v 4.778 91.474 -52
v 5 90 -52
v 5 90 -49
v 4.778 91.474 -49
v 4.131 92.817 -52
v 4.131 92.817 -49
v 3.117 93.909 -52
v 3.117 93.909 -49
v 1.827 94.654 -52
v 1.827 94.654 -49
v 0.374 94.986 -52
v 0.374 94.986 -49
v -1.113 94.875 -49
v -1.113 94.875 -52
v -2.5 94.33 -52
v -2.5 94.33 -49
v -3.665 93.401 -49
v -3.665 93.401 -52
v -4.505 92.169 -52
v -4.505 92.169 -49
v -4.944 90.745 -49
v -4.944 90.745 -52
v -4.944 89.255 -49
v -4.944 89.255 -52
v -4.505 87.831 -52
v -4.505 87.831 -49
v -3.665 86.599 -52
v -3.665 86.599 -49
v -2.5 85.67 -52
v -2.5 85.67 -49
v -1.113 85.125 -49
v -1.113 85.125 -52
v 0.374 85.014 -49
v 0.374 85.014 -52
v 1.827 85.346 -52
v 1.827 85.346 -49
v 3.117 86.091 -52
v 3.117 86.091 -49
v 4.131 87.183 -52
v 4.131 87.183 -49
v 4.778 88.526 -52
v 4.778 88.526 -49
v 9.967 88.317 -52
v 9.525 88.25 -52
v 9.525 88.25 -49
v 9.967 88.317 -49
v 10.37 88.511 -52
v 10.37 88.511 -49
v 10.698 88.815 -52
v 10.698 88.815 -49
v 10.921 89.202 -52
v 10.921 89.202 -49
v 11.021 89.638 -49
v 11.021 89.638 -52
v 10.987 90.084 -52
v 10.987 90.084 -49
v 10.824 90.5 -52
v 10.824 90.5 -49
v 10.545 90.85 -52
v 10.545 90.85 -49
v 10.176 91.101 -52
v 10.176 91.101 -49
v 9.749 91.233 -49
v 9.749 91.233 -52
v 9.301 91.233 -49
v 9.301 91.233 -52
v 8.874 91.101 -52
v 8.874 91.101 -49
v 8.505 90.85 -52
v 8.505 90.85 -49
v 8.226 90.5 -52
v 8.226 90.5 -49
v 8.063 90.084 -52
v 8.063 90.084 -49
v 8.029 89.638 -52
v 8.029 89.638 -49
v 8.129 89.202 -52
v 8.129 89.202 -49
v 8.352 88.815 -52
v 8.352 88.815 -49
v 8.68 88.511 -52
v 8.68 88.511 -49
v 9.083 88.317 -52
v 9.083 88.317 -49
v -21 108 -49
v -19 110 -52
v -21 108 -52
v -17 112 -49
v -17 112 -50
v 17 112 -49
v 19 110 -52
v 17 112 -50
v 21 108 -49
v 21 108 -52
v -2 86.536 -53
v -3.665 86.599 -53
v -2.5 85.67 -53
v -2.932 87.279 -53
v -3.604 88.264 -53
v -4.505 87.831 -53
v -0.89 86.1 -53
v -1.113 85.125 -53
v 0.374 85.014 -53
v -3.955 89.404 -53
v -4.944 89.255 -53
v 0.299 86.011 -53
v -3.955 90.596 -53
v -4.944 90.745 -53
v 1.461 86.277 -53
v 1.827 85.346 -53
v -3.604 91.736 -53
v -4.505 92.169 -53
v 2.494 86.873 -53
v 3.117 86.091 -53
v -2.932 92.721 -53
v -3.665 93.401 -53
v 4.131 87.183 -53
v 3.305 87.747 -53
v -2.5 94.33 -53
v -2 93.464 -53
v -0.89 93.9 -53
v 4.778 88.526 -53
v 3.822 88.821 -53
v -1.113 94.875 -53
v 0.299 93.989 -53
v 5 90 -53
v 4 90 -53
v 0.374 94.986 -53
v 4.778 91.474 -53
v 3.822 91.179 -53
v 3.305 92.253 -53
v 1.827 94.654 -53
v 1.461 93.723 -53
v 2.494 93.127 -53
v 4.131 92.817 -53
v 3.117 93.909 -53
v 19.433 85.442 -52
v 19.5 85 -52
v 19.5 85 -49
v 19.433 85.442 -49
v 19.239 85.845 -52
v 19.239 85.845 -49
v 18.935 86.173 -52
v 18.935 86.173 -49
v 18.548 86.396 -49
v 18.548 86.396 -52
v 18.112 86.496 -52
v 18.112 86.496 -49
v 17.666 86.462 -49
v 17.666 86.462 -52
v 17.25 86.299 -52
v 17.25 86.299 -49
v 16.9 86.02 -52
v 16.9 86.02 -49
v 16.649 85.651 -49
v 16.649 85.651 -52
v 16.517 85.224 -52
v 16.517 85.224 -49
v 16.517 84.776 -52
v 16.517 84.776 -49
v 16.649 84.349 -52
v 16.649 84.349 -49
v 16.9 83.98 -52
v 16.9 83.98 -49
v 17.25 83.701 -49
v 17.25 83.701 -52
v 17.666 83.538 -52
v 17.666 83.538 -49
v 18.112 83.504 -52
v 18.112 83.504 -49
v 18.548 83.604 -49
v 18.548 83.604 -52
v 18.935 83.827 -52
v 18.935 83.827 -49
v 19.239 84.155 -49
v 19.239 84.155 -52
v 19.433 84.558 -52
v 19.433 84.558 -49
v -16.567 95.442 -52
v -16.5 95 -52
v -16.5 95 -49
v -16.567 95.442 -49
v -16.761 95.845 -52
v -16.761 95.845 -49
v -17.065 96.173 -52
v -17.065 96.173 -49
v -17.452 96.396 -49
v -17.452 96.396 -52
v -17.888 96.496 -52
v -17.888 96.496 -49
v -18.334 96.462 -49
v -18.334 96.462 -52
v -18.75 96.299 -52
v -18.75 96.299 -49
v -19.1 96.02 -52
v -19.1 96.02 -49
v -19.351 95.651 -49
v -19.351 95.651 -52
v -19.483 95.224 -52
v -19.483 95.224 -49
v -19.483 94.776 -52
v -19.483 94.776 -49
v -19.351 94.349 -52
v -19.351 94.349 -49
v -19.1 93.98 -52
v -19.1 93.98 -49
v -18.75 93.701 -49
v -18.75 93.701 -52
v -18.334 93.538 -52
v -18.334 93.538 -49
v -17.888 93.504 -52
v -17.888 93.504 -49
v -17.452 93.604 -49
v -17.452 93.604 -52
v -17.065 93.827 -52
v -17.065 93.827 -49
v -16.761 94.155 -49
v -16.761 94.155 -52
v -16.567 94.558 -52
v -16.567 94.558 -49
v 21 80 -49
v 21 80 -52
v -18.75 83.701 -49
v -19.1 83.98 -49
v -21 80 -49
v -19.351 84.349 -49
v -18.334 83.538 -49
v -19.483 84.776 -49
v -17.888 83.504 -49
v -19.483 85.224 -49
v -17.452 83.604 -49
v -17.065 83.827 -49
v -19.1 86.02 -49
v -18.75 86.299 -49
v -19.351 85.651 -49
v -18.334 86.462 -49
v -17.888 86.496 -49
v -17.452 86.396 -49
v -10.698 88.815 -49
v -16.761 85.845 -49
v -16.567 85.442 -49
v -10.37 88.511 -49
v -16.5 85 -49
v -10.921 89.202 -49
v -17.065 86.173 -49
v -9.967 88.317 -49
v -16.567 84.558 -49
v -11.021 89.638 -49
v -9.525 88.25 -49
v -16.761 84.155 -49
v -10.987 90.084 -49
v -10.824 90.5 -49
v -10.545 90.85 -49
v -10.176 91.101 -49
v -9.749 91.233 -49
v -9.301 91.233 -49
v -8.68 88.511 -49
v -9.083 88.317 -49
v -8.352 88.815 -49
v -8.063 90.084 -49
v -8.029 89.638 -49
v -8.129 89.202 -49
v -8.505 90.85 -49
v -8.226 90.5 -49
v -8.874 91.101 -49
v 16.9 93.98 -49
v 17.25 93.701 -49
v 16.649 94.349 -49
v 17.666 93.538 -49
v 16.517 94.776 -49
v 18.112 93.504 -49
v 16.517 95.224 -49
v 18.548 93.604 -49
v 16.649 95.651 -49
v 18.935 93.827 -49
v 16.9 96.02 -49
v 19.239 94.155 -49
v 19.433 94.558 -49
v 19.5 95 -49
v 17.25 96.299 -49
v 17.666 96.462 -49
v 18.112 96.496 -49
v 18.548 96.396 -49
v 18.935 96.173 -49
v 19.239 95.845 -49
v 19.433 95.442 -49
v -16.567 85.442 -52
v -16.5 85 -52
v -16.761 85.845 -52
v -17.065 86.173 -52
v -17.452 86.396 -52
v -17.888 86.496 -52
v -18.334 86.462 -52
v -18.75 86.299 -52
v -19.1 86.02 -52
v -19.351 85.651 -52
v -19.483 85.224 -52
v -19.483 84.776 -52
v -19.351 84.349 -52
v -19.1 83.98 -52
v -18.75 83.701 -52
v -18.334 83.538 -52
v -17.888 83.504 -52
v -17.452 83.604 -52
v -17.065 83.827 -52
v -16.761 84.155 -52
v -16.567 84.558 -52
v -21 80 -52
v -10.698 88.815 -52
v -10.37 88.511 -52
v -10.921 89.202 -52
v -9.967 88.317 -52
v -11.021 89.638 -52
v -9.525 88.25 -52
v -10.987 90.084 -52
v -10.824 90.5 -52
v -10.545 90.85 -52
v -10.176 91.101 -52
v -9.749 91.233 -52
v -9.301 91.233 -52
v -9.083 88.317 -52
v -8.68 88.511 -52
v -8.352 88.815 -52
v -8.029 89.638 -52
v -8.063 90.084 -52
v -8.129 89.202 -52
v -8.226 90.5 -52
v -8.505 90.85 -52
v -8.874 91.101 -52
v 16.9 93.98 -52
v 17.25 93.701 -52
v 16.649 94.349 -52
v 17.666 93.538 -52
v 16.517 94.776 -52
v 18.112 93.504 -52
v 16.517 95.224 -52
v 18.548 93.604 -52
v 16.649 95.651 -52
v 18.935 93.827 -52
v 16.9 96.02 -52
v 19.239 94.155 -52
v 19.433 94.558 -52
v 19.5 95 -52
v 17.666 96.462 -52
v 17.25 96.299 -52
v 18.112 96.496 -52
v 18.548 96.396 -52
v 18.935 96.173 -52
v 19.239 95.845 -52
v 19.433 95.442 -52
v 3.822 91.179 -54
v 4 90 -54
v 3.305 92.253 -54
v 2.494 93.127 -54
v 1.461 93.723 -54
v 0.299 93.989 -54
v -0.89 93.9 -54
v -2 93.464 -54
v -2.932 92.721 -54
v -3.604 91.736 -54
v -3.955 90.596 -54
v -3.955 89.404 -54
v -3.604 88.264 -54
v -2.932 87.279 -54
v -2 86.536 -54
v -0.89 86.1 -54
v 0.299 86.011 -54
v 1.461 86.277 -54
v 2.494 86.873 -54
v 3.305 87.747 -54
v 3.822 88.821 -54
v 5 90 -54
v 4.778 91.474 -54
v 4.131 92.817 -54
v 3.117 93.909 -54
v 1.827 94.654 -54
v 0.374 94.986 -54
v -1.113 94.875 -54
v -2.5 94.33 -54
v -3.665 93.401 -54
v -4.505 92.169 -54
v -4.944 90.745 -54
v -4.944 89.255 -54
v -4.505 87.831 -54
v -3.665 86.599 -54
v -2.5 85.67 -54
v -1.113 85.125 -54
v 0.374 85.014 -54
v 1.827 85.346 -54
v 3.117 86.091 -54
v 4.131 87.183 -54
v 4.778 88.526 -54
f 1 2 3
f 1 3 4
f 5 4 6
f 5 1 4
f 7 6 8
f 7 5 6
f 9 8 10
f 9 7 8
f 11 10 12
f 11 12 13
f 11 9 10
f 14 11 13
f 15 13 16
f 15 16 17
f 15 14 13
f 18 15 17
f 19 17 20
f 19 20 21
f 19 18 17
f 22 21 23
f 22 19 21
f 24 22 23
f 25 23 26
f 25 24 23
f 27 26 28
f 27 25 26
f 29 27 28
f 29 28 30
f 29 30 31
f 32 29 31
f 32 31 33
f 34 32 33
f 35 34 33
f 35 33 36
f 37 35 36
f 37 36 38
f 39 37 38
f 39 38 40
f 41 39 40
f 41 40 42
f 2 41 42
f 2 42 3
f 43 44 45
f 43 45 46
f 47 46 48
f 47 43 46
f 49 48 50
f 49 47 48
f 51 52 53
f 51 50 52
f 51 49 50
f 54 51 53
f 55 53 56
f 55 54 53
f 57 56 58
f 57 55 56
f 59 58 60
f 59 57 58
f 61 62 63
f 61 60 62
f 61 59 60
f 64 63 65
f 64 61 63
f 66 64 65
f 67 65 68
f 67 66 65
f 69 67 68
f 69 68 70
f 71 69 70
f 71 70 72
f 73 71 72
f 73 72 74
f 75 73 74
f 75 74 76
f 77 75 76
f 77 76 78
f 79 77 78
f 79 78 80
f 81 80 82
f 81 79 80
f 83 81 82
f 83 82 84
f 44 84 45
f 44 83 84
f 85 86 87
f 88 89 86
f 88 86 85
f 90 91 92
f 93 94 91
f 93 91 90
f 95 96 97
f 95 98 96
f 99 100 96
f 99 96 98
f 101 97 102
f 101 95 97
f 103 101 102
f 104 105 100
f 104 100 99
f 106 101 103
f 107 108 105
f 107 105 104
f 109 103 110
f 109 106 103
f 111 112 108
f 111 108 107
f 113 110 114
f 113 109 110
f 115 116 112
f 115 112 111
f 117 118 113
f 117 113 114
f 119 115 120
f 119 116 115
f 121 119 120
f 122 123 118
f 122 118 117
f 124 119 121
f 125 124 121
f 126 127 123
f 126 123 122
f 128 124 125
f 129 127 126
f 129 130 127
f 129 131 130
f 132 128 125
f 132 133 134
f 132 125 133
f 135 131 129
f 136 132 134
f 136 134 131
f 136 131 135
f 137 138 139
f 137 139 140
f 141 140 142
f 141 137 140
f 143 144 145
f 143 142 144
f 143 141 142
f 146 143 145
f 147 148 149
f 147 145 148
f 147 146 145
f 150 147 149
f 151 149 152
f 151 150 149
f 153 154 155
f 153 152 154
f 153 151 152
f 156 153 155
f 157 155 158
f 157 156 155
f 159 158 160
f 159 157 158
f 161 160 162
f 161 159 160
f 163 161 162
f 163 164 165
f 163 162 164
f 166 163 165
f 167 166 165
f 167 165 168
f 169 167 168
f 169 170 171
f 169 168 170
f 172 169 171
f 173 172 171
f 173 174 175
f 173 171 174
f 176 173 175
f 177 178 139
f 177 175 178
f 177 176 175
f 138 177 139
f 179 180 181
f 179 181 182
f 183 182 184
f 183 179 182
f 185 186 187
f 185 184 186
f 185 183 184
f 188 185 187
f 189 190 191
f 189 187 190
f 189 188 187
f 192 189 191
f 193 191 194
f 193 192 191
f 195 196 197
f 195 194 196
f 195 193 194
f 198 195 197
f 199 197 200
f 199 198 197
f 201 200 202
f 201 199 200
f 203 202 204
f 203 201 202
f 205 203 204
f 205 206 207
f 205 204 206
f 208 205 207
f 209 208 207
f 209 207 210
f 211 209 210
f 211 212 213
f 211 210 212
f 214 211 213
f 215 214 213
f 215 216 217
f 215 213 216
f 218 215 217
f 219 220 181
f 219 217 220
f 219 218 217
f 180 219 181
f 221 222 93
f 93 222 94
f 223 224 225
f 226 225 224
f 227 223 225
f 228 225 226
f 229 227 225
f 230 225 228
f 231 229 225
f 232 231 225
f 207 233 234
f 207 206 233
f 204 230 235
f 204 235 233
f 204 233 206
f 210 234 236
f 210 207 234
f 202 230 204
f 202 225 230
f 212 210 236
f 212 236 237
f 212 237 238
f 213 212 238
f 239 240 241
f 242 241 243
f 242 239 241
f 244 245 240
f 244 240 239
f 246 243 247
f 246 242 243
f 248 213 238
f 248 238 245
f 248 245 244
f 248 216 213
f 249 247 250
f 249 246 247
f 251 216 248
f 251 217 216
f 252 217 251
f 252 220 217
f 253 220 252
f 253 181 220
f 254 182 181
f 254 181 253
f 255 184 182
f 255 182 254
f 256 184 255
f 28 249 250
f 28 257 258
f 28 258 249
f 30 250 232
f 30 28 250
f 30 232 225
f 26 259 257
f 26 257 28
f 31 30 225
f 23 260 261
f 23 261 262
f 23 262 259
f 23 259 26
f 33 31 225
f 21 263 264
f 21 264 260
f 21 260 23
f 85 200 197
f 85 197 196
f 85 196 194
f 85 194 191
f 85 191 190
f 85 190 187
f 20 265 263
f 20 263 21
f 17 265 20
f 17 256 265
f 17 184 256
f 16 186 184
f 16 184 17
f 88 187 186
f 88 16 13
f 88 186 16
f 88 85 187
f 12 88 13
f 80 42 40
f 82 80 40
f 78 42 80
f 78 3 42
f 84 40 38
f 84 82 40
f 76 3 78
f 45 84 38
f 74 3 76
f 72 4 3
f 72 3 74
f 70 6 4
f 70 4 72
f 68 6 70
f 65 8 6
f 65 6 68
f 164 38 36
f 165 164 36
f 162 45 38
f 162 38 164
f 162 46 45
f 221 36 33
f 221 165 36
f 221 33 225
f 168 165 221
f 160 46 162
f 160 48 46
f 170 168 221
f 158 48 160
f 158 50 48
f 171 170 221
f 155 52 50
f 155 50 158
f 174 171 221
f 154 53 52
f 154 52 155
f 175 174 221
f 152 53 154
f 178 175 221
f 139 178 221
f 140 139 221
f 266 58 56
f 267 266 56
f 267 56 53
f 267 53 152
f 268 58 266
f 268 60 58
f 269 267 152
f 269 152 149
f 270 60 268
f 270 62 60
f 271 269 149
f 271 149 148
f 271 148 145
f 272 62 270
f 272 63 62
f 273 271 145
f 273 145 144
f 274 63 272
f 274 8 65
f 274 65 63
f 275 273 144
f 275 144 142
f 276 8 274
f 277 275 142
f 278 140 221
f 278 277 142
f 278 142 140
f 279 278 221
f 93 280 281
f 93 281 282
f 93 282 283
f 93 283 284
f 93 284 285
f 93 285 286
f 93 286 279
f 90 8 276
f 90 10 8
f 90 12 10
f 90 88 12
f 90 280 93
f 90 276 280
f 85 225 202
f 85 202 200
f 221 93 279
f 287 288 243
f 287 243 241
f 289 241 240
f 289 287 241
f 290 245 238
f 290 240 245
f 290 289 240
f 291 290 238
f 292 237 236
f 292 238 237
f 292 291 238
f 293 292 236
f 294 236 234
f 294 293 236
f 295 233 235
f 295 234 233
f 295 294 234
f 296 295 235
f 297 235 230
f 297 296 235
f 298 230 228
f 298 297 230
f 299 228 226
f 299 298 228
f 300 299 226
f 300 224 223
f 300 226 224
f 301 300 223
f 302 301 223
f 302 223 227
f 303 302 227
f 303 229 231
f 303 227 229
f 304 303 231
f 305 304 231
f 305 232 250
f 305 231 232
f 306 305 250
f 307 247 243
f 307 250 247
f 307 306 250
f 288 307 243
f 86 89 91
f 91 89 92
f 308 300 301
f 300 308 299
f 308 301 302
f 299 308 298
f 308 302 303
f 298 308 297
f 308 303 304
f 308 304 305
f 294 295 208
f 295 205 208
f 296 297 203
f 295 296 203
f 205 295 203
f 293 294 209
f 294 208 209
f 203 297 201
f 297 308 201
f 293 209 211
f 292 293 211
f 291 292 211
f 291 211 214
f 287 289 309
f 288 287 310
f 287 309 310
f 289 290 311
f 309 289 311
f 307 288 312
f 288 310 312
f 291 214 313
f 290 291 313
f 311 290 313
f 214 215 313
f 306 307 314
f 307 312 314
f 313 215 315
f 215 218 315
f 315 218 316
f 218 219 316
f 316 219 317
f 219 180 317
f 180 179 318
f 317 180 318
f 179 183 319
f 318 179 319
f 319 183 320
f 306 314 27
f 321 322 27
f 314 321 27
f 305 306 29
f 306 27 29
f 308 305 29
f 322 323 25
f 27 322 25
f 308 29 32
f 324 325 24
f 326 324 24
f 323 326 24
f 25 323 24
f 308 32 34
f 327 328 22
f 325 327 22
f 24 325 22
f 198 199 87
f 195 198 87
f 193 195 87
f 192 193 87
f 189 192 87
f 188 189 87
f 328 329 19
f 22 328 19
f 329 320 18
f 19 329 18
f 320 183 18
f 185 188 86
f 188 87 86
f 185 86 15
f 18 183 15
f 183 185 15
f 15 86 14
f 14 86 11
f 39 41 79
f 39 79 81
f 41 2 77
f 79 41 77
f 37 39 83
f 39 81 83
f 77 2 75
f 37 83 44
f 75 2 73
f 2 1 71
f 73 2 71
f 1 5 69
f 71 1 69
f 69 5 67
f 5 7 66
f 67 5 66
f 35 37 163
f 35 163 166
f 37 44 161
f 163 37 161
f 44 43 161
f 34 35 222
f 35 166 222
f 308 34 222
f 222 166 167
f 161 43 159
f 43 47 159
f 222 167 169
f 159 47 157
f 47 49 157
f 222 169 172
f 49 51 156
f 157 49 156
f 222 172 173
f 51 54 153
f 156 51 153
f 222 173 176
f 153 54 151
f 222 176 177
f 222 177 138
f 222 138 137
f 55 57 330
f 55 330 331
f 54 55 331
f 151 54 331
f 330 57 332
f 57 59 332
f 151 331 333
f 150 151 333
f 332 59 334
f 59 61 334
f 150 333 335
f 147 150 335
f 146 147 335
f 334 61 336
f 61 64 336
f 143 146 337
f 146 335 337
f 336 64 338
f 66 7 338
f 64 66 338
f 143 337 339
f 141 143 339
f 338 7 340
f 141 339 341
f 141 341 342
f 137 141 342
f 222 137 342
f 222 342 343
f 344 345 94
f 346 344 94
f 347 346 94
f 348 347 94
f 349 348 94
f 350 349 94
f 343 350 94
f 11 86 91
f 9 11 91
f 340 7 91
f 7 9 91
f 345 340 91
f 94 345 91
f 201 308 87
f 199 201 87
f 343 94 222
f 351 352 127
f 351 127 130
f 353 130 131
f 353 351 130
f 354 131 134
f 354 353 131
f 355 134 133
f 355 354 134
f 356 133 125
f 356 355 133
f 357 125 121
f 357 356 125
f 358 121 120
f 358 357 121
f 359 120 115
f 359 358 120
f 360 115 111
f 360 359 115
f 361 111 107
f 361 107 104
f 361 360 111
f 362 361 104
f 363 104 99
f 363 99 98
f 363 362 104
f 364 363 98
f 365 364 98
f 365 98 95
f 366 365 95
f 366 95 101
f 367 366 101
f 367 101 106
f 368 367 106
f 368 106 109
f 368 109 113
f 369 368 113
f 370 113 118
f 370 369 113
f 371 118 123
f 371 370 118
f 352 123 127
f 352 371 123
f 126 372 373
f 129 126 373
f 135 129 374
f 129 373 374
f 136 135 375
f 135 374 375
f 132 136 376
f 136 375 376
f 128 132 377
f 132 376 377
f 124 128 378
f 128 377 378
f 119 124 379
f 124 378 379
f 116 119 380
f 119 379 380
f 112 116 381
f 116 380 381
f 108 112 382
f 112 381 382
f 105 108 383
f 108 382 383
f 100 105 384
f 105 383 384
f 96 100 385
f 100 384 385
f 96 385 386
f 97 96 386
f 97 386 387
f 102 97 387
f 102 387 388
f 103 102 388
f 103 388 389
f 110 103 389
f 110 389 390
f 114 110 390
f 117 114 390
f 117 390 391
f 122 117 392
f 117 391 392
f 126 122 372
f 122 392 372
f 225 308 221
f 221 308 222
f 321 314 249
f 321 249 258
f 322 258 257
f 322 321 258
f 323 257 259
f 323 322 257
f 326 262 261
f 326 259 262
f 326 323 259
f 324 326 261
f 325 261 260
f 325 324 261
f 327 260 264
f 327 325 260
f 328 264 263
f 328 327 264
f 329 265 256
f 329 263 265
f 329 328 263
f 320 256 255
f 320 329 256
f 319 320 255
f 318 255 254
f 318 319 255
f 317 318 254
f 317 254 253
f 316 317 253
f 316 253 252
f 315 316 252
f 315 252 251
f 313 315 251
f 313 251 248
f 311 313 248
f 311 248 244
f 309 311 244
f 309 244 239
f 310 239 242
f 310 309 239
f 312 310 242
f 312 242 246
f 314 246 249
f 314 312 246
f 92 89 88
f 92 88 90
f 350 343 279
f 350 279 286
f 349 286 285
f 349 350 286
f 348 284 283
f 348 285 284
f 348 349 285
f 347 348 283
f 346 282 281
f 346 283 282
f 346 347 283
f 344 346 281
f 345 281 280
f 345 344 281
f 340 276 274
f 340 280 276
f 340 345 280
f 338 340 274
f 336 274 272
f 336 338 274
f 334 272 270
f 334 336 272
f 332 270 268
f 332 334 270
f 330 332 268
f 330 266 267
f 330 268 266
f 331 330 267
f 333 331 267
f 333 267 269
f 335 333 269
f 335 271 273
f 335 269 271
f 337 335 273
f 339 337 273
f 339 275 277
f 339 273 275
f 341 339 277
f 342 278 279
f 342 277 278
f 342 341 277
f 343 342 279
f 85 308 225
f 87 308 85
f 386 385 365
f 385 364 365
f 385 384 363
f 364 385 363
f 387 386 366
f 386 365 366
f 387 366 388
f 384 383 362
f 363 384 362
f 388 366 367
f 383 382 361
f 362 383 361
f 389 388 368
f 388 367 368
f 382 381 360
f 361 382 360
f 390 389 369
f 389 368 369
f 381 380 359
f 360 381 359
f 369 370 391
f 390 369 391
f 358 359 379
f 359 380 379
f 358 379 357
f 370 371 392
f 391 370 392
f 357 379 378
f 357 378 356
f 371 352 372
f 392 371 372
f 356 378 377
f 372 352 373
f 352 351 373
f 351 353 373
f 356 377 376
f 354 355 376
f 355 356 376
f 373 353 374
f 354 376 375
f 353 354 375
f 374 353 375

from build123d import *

# Parameters (mm, degrees)
TUBE066_R                   = 5
TUBE066_R_2                 = 4
TUBE066_DEPTH               = 1
CYLINDER1691_R              = 1.5
CYLINDER1691_DEPTH          = 20
CYLINDER1688_R              = 1.5
CYLINDER1688_DEPTH          = 20
COMPOUND839_ROLL_ANGLE      = 90
COMPOUND839_PLACEMENT_ANGLE = 90
CYLINDER1679_R              = 1.5
CYLINDER1679_DEPTH          = 60
CYLINDER1686_R              = 1.5
CYLINDER1686_DEPTH          = 60
CYLINDER1680_R              = 1.5
CYLINDER1680_DEPTH          = 60
CYLINDER1684_R              = 1.5
CYLINDER1684_DEPTH          = 60
CYLINDER1678_R              = 5
CYLINDER1678_DEPTH          = 4
BOX658_W                    = 42
BOX658_H                    = 32
BOX658_DEPTH                = 3
CHAMFER052_SIZE             = 4
CHAMFER051_SIZE             = 2


with BuildPart() as tube066:
    # Tube066 → Tube066 (new body)
    with BuildSketch(Plane(origin=(0, 90, -54), x_dir=(1, 0, 0), z_dir=(0, 0, 1))):
        Circle(TUBE066_R)
        Circle(TUBE066_R_2, mode=Mode.SUBTRACT)
    extrude(amount=TUBE066_DEPTH)


with BuildPart() as v_lec1691:
    # Cylinder1691 → Cylinder1691 (new body)
    with BuildSketch(Plane(origin=(15.75, 114, 58.525), x_dir=(-1, 0, 0), z_dir=(0, 1, 0))):
        Circle(CYLINDER1691_R)
    extrude(amount=CYLINDER1691_DEPTH)


with BuildPart() as compound843:
    # Cylinder1688 → Cylinder1688 (new body)
    with BuildSketch(Plane(origin=(15.75, 114, 39.475), x_dir=(-1, 0, 0), z_dir=(0, 1, 0))):
        Circle(CYLINDER1688_R)
    extrude(amount=CYLINDER1688_DEPTH)

    # Compound839: union Válec1691
    add(v_lec1691.part)


with BuildPart() as compound843_1:
    # Compound839 roll: moved
    add(compound843.part.rotate(Axis((0, 0, 0), (1, 0, 0)), COMPOUND839_ROLL_ANGLE))


with BuildPart() as compound843_2:
    # Compound839 placement: moved
    add(compound843_1.part.moved(Location((-49, 0, -96))).rotate(Axis((-49, 0, -96), (0, 0, 1)), COMPOUND839_PLACEMENT_ANGLE))


with BuildPart() as compound843_3:
    # Compound843 placement: moved
    add(compound843_2.part.moved(Location((0, 74, -80))))


with BuildPart() as v_lec1679:
    # Cylinder1679 → Cylinder1679 (new body)
    with BuildSketch(Plane(origin=(18, 85, -57), x_dir=(1, 0, 0), z_dir=(0, 0, 1))):
        Circle(CYLINDER1679_R)
    extrude(amount=CYLINDER1679_DEPTH)


with BuildPart() as v_lec1686:
    # Cylinder1686 → Cylinder1686 (new body)
    with BuildSketch(Plane(origin=(-18, 85, -57), x_dir=(1, 0, 0), z_dir=(0, 0, 1))):
        Circle(CYLINDER1686_R)
    extrude(amount=CYLINDER1686_DEPTH)


with BuildPart() as v_lec1680:
    # Cylinder1680 → Cylinder1680 (new body)
    with BuildSketch(Plane(origin=(-18, 95, -57), x_dir=(1, 0, 0), z_dir=(0, 0, 1))):
        Circle(CYLINDER1680_R)
    extrude(amount=CYLINDER1680_DEPTH)


with BuildPart() as compound835:
    # Cylinder1684 → Cylinder1684 (new body)
    with BuildSketch(Plane(origin=(18, 95, -57), x_dir=(1, 0, 0), z_dir=(0, 0, 1))):
        Circle(CYLINDER1684_R)
    extrude(amount=CYLINDER1684_DEPTH)

    # Compound835: union Válec1679, Válec1686, Válec1680
    add(v_lec1679.part)
    add(v_lec1686.part)
    add(v_lec1680.part)


with BuildPart() as v_lec1678:
    # Cylinder1678 → Cylinder1678 (new body)
    with BuildSketch(Plane(origin=(0, 90, -53), x_dir=(1, 0, 0), z_dir=(0, 0, 1))):
        Circle(CYLINDER1678_R)
    extrude(amount=CYLINDER1678_DEPTH)


with BuildPart() as chamfer051:
    # Box658 → Box658 (new body)
    with BuildSketch(Plane(origin=(-21, 80, -52), x_dir=(1, 0, 0), z_dir=(0, 0, 1))):
        with Locations((21, 16)):
            Rectangle(BOX658_W, BOX658_H)
    extrude(amount=BOX658_DEPTH)

    # Cut336: cut Válec1678
    add(v_lec1678.part, mode=Mode.SUBTRACT)

    # Cut343: cut Compound835
    add(compound835.part, mode=Mode.SUBTRACT)

    # Cut342: cut Compound843
    add(compound843_3.part, mode=Mode.SUBTRACT)

    # Compound838: union Tube066
    add(tube066.part)

    # Chamfer052
    chamfer052_edges = [chamfer051.edges().sort_by_distance(p)[0] for p in [
        (-21, 112, -50.5),
        (21, 112, -50.5),
    ]]
    chamfer(chamfer052_edges, length=CHAMFER052_SIZE)

    # Chamfer051
    chamfer051_edges = [chamfer051.edges().sort_by_distance(p)[0] for p in [
        (0, 112, -52),
    ]]
    chamfer(chamfer051_edges, length=CHAMFER051_SIZE)


solid = chamfer051.part
